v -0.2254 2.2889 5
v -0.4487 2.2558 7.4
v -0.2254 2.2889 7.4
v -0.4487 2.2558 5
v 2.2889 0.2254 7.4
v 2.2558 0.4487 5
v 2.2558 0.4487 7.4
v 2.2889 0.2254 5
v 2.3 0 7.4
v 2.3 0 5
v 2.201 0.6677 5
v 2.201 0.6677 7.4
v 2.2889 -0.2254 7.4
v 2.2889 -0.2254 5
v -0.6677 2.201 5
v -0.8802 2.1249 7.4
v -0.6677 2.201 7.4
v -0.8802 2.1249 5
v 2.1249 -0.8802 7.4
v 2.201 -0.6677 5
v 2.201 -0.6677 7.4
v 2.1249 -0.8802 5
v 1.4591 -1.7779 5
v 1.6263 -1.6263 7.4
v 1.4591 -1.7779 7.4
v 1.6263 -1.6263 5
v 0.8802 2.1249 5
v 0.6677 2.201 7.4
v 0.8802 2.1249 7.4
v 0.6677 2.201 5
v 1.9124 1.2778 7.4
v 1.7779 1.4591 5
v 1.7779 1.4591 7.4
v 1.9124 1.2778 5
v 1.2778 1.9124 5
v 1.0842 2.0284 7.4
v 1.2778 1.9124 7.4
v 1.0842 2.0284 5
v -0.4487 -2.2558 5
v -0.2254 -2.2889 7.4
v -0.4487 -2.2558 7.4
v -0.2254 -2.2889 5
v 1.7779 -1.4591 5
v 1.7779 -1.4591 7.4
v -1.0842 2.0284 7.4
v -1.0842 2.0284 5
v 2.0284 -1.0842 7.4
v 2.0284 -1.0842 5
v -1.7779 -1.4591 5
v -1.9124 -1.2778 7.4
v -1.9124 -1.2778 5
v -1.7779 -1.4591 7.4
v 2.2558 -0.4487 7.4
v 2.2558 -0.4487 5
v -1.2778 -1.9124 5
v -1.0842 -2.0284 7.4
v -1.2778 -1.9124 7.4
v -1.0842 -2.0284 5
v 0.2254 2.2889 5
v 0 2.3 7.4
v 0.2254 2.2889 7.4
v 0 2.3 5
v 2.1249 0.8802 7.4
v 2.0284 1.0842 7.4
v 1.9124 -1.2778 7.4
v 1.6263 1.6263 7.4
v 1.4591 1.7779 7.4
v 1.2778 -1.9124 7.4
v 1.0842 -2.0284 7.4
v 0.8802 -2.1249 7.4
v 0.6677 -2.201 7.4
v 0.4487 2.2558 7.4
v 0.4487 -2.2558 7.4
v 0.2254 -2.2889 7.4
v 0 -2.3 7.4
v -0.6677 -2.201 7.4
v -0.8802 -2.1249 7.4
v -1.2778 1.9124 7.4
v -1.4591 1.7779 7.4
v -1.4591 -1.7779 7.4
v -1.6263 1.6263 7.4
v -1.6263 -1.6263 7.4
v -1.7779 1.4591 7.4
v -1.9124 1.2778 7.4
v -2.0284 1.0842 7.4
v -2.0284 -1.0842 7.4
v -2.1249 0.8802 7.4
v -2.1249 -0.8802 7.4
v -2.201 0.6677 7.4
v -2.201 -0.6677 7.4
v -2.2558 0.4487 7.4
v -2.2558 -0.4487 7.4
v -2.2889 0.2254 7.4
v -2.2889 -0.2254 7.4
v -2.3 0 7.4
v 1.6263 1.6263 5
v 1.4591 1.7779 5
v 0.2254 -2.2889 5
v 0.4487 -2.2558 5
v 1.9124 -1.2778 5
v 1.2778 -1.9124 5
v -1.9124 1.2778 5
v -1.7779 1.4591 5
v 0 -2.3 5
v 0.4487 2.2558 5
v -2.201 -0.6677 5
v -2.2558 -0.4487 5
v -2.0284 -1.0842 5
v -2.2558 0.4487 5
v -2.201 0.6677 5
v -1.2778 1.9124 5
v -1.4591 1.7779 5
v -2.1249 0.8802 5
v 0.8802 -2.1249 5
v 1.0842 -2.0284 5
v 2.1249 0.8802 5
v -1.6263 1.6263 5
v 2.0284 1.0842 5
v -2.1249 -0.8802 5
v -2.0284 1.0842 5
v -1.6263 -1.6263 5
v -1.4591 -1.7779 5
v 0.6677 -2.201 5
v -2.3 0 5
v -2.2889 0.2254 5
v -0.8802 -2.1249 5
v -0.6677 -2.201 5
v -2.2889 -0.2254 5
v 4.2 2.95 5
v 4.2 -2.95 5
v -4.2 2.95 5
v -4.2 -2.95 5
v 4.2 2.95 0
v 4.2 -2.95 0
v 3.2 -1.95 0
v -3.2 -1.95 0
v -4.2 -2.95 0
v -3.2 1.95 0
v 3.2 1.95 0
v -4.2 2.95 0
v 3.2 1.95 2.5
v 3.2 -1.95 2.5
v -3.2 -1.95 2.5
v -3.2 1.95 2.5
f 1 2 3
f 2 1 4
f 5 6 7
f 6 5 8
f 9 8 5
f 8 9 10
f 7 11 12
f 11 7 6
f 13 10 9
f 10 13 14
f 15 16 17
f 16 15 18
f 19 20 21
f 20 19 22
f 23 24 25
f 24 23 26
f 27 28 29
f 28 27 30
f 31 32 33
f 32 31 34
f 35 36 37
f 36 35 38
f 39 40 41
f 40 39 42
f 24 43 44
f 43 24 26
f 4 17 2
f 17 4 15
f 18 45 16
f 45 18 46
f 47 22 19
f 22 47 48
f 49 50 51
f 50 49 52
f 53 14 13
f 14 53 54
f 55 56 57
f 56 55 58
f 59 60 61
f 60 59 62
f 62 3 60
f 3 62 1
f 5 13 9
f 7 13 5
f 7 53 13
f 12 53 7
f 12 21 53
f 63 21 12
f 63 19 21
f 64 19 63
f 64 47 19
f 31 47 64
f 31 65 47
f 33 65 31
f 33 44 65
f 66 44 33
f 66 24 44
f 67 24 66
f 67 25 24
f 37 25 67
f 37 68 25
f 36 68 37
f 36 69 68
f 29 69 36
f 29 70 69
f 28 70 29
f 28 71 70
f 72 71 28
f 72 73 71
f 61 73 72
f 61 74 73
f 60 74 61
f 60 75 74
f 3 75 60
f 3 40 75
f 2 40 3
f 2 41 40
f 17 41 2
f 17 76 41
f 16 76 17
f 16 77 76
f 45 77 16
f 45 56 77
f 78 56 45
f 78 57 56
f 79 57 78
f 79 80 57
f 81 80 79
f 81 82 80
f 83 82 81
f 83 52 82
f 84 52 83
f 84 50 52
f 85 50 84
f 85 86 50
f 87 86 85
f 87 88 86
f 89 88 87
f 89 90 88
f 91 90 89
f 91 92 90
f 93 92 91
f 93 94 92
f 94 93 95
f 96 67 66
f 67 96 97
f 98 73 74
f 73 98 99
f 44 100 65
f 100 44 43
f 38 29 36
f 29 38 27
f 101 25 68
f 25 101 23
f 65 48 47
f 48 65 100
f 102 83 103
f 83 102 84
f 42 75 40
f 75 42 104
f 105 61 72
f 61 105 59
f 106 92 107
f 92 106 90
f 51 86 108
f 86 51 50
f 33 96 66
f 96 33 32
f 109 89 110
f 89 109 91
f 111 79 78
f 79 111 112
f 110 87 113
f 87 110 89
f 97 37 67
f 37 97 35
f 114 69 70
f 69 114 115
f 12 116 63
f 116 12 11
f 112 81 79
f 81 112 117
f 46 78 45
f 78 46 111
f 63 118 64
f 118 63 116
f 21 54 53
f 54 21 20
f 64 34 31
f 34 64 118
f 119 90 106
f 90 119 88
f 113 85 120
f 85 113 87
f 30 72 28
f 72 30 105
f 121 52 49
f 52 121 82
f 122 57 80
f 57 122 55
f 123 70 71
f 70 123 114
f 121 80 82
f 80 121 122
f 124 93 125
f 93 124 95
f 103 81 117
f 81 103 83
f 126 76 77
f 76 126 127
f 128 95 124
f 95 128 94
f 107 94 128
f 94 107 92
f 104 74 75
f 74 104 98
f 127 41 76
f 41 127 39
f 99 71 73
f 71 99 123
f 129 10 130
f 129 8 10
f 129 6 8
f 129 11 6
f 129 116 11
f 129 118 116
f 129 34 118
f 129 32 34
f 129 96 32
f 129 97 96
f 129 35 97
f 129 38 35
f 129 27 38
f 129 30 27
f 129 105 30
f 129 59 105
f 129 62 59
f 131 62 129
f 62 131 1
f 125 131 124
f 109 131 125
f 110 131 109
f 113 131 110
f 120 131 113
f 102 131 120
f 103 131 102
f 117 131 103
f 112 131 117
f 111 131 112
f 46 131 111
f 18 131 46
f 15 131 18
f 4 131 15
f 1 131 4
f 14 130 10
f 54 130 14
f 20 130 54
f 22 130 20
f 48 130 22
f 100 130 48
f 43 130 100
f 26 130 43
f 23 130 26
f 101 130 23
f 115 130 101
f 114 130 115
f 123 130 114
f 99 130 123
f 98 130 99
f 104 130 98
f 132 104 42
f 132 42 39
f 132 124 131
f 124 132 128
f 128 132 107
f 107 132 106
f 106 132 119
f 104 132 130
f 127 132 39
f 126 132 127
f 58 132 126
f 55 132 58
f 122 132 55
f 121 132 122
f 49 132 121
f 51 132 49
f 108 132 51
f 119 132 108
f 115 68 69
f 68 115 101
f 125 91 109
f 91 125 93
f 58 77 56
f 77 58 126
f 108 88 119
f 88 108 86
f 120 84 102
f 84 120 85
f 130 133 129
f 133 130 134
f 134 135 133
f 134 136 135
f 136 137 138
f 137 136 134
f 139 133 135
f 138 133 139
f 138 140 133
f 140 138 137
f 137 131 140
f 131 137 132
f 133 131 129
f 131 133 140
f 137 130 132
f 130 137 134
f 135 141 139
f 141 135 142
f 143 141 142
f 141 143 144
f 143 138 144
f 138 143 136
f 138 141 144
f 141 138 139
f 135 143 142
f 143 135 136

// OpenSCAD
// file: Screw.scad
/* Screw Library */
/* (c)copyright 2018 by Gerald Wodni <gerald.wodni@gmail.com> */

/** M3 **/
M3shaft = 4;
M3head = 6.5;
M3transition = 0.5;
M3Nut = 7;
M3NutHeight = 2.5;
M3NutCage = 15;

NutDiameter = 7;

E = 0.1;
E2 = E/2;

module m3NutHole(x, y, h) {
    translate([x, y]) {
        translate([0, 0, -h-E2])
        cylinder(d=M3shaft, h=h+E, $fn=32);
        
        translate([0, 0, -NutDepth])
        cylinder(d=NutDiameter, h=h+E, $fn=6);
    }
}

module m3Padding(x, y, h, padding) {
    translate([x,y])
    cylinder( d=M3shaft + padding*2, h = h );
}

module m3(x = 0,y = 0, depth = 10, head = 0, nut = 0) {
    translate([x,y]) {
        /* shaft */
        translate([0,0,-E])
        cylinder(d=M3shaft, h=depth+E);
        
        /* transition */
        translate([0, 0, depth-head-E-M3transition])
        cylinder(d1=M3shaft, d2=M3head, M3transition+E*2);
        
        /* head */
        translate([0, 0, depth-head])
            cylinder(d=M3head, h=head+E);
        
        if( nut > 0 )
            translate([0,0,-E2])
            cylinder( d=M3Nut, h = E+nut, $fn=6 );
    }
}
// main file
/* Handheld + Diffusor for Bitkanone V2 */
/* (c)copyright 2018 by Gerald Wodni <gerald.wodni@gmail.com> */

/* general settings */
Columns = 7;
PlateWidth = 98;

ScreenThickness = 0.4;

PillarHeight = 7;

LedHeight = 2;
LedDistance = PlateWidth/Columns;

DiffusorHeight = PillarHeight-LedHeight;
LedDiameter = 4;
DiffusorDiameter = 8;

DiffusorWall = 0.5;

/* Wall cutouts */
OuterWall = 1;
InterConnectHeight = 3;
InterConnectWidth = 13;
UsbWidth = 10;
UsbHeight = 4;
UsbOffset = LedDistance*2-UsbWidth/2;

/* buttons */
/* button = printed; switch = mechanical */
ButtonDiameter = 5;
ButtonTop = ScreenThickness+2;
ButtonSpacing = 0.2;
SwitchWidth = 6   + ButtonSpacing*2;
SwitchDepth = 3.5 + ButtonSpacing*2;
SwitchHeight = 4.5;
SwitchBase = 2;
ButtonTopDiameter = ButtonDiameter-ButtonSpacing*2;
ButtonWall = 1;


/* helpers */
E = 0.01;
$fn=64;

include <Screw.scad>;

PillarWall=1.2;
PillarDiameter = M3head + PillarWall*2;;



E2 = E/2;

module screwPillar(x,y) {
    inset = PillarHeight-LedHeight;
    translate([x,y]){
        difference() {
            cylinder(d=PillarDiameter, h=PillarHeight);
            
            translate([0,0,PillarHeight])
            mirror([0,0,1])
            m3(0, 0, PillarHeight+ScreenThickness+E, inset);
        }
    }
}

module diffusor(x,y) {
    translate([x*LedDistance, y*LedDistance, -E]) {
        difference() {
            cylinder(d2=LedDiameter+DiffusorWall*2, d1=DiffusorDiameter+DiffusorWall*2, h=DiffusorHeight);
            cylinder(d2=LedDiameter, d1=DiffusorDiameter, h=DiffusorHeight+E);
        }
    }
}

PillarOffset = 14;
module plateGuides() {
    union()
    translate([-PlateWidth/2, -PlateWidth/2]) {
        
        /* screw pillars */
        screwPillar(PillarOffset, PillarOffset);
        screwPillar(PlateWidth-PillarOffset, PillarOffset);
        screwPillar(PillarOffset*2, PlateWidth-PillarOffset);
        
        /* diffusor guidances */
        translate([LedDistance/2, LedDistance/2])
        for( y = [0:Columns-1] )
            for( x = [0:Columns-1] )
                diffusor(x, y);
        
        /* plate - main diffusor */
        translate([0, 0, -ScreenThickness])
        cube([PlateWidth, PlateWidth, ScreenThickness]);
    }
}

module buttonHole(x,y) {
    translate([x * LedDistance, y * LedDistance])
    cylinder(d=ButtonDiameter, h=ScreenThickness+E);
}

module screwInset(x, y) {
    translate([x, y])
    cylinder(d=M3head, h=ScreenThickness+E);
}

module walls() {
    difference() {
        cube([PlateWidth, PlateWidth, PillarHeight]);
        translate([OuterWall, OuterWall, -E2])
        cube([PlateWidth-OuterWall*2, PlateWidth-OuterWall*2, PillarHeight+E]);
        
        translate([-E2, PlateWidth/2-InterConnectWidth/2, PillarHeight-InterConnectHeight])
        cube([PlateWidth+E, InterConnectWidth, InterConnectHeight+E]);
        translate([PlateWidth/2-InterConnectWidth/2, -E2, PillarHeight-InterConnectHeight])
        cube([InterConnectWidth, PlateWidth+E, InterConnectHeight+E]);
        
        translate([-E2, UsbOffset, PillarHeight-UsbHeight])
        cube([OuterWall+E, UsbWidth, UsbHeight+E]);
    }
}

module top() {
    difference() {
        union() {
            plateGuides();
            translate([-PlateWidth/2, -PlateWidth/2])
            walls();
        }
        translate([-PlateWidth/2, -PlateWidth/2, -ScreenThickness-E2]) {
            screwInset(PillarOffset, PillarOffset);
            screwInset(PlateWidth-PillarOffset, PillarOffset);
            screwInset(PillarOffset*2, PlateWidth-PillarOffset);

            buttonHole( 1, 5 );
            buttonHole( 5, 5 );
            buttonHole( 6, 5 );
        }
    }
}

module button() {
    baseHeight = PillarHeight - SwitchBase;
    cutoutHeight = SwitchHeight-SwitchBase;

    difference() {
        union() {
            /* top */
            translate([0, 0, baseHeight])
            cylinder( d = ButtonTopDiameter, h = ButtonTop );

            /* base */
            baseWidth = SwitchWidth + ButtonWall*2;
            baseDepth = SwitchDepth + ButtonWall*2;
            translate([-baseWidth/2, -baseDepth/2])
            cube([baseWidth, baseDepth, baseHeight]);
        }

        translate([-SwitchWidth/2, -SwitchDepth/2, -E])
        cube([SwitchWidth, SwitchDepth, cutoutHeight+E]);
    }
}

// top();
button();
